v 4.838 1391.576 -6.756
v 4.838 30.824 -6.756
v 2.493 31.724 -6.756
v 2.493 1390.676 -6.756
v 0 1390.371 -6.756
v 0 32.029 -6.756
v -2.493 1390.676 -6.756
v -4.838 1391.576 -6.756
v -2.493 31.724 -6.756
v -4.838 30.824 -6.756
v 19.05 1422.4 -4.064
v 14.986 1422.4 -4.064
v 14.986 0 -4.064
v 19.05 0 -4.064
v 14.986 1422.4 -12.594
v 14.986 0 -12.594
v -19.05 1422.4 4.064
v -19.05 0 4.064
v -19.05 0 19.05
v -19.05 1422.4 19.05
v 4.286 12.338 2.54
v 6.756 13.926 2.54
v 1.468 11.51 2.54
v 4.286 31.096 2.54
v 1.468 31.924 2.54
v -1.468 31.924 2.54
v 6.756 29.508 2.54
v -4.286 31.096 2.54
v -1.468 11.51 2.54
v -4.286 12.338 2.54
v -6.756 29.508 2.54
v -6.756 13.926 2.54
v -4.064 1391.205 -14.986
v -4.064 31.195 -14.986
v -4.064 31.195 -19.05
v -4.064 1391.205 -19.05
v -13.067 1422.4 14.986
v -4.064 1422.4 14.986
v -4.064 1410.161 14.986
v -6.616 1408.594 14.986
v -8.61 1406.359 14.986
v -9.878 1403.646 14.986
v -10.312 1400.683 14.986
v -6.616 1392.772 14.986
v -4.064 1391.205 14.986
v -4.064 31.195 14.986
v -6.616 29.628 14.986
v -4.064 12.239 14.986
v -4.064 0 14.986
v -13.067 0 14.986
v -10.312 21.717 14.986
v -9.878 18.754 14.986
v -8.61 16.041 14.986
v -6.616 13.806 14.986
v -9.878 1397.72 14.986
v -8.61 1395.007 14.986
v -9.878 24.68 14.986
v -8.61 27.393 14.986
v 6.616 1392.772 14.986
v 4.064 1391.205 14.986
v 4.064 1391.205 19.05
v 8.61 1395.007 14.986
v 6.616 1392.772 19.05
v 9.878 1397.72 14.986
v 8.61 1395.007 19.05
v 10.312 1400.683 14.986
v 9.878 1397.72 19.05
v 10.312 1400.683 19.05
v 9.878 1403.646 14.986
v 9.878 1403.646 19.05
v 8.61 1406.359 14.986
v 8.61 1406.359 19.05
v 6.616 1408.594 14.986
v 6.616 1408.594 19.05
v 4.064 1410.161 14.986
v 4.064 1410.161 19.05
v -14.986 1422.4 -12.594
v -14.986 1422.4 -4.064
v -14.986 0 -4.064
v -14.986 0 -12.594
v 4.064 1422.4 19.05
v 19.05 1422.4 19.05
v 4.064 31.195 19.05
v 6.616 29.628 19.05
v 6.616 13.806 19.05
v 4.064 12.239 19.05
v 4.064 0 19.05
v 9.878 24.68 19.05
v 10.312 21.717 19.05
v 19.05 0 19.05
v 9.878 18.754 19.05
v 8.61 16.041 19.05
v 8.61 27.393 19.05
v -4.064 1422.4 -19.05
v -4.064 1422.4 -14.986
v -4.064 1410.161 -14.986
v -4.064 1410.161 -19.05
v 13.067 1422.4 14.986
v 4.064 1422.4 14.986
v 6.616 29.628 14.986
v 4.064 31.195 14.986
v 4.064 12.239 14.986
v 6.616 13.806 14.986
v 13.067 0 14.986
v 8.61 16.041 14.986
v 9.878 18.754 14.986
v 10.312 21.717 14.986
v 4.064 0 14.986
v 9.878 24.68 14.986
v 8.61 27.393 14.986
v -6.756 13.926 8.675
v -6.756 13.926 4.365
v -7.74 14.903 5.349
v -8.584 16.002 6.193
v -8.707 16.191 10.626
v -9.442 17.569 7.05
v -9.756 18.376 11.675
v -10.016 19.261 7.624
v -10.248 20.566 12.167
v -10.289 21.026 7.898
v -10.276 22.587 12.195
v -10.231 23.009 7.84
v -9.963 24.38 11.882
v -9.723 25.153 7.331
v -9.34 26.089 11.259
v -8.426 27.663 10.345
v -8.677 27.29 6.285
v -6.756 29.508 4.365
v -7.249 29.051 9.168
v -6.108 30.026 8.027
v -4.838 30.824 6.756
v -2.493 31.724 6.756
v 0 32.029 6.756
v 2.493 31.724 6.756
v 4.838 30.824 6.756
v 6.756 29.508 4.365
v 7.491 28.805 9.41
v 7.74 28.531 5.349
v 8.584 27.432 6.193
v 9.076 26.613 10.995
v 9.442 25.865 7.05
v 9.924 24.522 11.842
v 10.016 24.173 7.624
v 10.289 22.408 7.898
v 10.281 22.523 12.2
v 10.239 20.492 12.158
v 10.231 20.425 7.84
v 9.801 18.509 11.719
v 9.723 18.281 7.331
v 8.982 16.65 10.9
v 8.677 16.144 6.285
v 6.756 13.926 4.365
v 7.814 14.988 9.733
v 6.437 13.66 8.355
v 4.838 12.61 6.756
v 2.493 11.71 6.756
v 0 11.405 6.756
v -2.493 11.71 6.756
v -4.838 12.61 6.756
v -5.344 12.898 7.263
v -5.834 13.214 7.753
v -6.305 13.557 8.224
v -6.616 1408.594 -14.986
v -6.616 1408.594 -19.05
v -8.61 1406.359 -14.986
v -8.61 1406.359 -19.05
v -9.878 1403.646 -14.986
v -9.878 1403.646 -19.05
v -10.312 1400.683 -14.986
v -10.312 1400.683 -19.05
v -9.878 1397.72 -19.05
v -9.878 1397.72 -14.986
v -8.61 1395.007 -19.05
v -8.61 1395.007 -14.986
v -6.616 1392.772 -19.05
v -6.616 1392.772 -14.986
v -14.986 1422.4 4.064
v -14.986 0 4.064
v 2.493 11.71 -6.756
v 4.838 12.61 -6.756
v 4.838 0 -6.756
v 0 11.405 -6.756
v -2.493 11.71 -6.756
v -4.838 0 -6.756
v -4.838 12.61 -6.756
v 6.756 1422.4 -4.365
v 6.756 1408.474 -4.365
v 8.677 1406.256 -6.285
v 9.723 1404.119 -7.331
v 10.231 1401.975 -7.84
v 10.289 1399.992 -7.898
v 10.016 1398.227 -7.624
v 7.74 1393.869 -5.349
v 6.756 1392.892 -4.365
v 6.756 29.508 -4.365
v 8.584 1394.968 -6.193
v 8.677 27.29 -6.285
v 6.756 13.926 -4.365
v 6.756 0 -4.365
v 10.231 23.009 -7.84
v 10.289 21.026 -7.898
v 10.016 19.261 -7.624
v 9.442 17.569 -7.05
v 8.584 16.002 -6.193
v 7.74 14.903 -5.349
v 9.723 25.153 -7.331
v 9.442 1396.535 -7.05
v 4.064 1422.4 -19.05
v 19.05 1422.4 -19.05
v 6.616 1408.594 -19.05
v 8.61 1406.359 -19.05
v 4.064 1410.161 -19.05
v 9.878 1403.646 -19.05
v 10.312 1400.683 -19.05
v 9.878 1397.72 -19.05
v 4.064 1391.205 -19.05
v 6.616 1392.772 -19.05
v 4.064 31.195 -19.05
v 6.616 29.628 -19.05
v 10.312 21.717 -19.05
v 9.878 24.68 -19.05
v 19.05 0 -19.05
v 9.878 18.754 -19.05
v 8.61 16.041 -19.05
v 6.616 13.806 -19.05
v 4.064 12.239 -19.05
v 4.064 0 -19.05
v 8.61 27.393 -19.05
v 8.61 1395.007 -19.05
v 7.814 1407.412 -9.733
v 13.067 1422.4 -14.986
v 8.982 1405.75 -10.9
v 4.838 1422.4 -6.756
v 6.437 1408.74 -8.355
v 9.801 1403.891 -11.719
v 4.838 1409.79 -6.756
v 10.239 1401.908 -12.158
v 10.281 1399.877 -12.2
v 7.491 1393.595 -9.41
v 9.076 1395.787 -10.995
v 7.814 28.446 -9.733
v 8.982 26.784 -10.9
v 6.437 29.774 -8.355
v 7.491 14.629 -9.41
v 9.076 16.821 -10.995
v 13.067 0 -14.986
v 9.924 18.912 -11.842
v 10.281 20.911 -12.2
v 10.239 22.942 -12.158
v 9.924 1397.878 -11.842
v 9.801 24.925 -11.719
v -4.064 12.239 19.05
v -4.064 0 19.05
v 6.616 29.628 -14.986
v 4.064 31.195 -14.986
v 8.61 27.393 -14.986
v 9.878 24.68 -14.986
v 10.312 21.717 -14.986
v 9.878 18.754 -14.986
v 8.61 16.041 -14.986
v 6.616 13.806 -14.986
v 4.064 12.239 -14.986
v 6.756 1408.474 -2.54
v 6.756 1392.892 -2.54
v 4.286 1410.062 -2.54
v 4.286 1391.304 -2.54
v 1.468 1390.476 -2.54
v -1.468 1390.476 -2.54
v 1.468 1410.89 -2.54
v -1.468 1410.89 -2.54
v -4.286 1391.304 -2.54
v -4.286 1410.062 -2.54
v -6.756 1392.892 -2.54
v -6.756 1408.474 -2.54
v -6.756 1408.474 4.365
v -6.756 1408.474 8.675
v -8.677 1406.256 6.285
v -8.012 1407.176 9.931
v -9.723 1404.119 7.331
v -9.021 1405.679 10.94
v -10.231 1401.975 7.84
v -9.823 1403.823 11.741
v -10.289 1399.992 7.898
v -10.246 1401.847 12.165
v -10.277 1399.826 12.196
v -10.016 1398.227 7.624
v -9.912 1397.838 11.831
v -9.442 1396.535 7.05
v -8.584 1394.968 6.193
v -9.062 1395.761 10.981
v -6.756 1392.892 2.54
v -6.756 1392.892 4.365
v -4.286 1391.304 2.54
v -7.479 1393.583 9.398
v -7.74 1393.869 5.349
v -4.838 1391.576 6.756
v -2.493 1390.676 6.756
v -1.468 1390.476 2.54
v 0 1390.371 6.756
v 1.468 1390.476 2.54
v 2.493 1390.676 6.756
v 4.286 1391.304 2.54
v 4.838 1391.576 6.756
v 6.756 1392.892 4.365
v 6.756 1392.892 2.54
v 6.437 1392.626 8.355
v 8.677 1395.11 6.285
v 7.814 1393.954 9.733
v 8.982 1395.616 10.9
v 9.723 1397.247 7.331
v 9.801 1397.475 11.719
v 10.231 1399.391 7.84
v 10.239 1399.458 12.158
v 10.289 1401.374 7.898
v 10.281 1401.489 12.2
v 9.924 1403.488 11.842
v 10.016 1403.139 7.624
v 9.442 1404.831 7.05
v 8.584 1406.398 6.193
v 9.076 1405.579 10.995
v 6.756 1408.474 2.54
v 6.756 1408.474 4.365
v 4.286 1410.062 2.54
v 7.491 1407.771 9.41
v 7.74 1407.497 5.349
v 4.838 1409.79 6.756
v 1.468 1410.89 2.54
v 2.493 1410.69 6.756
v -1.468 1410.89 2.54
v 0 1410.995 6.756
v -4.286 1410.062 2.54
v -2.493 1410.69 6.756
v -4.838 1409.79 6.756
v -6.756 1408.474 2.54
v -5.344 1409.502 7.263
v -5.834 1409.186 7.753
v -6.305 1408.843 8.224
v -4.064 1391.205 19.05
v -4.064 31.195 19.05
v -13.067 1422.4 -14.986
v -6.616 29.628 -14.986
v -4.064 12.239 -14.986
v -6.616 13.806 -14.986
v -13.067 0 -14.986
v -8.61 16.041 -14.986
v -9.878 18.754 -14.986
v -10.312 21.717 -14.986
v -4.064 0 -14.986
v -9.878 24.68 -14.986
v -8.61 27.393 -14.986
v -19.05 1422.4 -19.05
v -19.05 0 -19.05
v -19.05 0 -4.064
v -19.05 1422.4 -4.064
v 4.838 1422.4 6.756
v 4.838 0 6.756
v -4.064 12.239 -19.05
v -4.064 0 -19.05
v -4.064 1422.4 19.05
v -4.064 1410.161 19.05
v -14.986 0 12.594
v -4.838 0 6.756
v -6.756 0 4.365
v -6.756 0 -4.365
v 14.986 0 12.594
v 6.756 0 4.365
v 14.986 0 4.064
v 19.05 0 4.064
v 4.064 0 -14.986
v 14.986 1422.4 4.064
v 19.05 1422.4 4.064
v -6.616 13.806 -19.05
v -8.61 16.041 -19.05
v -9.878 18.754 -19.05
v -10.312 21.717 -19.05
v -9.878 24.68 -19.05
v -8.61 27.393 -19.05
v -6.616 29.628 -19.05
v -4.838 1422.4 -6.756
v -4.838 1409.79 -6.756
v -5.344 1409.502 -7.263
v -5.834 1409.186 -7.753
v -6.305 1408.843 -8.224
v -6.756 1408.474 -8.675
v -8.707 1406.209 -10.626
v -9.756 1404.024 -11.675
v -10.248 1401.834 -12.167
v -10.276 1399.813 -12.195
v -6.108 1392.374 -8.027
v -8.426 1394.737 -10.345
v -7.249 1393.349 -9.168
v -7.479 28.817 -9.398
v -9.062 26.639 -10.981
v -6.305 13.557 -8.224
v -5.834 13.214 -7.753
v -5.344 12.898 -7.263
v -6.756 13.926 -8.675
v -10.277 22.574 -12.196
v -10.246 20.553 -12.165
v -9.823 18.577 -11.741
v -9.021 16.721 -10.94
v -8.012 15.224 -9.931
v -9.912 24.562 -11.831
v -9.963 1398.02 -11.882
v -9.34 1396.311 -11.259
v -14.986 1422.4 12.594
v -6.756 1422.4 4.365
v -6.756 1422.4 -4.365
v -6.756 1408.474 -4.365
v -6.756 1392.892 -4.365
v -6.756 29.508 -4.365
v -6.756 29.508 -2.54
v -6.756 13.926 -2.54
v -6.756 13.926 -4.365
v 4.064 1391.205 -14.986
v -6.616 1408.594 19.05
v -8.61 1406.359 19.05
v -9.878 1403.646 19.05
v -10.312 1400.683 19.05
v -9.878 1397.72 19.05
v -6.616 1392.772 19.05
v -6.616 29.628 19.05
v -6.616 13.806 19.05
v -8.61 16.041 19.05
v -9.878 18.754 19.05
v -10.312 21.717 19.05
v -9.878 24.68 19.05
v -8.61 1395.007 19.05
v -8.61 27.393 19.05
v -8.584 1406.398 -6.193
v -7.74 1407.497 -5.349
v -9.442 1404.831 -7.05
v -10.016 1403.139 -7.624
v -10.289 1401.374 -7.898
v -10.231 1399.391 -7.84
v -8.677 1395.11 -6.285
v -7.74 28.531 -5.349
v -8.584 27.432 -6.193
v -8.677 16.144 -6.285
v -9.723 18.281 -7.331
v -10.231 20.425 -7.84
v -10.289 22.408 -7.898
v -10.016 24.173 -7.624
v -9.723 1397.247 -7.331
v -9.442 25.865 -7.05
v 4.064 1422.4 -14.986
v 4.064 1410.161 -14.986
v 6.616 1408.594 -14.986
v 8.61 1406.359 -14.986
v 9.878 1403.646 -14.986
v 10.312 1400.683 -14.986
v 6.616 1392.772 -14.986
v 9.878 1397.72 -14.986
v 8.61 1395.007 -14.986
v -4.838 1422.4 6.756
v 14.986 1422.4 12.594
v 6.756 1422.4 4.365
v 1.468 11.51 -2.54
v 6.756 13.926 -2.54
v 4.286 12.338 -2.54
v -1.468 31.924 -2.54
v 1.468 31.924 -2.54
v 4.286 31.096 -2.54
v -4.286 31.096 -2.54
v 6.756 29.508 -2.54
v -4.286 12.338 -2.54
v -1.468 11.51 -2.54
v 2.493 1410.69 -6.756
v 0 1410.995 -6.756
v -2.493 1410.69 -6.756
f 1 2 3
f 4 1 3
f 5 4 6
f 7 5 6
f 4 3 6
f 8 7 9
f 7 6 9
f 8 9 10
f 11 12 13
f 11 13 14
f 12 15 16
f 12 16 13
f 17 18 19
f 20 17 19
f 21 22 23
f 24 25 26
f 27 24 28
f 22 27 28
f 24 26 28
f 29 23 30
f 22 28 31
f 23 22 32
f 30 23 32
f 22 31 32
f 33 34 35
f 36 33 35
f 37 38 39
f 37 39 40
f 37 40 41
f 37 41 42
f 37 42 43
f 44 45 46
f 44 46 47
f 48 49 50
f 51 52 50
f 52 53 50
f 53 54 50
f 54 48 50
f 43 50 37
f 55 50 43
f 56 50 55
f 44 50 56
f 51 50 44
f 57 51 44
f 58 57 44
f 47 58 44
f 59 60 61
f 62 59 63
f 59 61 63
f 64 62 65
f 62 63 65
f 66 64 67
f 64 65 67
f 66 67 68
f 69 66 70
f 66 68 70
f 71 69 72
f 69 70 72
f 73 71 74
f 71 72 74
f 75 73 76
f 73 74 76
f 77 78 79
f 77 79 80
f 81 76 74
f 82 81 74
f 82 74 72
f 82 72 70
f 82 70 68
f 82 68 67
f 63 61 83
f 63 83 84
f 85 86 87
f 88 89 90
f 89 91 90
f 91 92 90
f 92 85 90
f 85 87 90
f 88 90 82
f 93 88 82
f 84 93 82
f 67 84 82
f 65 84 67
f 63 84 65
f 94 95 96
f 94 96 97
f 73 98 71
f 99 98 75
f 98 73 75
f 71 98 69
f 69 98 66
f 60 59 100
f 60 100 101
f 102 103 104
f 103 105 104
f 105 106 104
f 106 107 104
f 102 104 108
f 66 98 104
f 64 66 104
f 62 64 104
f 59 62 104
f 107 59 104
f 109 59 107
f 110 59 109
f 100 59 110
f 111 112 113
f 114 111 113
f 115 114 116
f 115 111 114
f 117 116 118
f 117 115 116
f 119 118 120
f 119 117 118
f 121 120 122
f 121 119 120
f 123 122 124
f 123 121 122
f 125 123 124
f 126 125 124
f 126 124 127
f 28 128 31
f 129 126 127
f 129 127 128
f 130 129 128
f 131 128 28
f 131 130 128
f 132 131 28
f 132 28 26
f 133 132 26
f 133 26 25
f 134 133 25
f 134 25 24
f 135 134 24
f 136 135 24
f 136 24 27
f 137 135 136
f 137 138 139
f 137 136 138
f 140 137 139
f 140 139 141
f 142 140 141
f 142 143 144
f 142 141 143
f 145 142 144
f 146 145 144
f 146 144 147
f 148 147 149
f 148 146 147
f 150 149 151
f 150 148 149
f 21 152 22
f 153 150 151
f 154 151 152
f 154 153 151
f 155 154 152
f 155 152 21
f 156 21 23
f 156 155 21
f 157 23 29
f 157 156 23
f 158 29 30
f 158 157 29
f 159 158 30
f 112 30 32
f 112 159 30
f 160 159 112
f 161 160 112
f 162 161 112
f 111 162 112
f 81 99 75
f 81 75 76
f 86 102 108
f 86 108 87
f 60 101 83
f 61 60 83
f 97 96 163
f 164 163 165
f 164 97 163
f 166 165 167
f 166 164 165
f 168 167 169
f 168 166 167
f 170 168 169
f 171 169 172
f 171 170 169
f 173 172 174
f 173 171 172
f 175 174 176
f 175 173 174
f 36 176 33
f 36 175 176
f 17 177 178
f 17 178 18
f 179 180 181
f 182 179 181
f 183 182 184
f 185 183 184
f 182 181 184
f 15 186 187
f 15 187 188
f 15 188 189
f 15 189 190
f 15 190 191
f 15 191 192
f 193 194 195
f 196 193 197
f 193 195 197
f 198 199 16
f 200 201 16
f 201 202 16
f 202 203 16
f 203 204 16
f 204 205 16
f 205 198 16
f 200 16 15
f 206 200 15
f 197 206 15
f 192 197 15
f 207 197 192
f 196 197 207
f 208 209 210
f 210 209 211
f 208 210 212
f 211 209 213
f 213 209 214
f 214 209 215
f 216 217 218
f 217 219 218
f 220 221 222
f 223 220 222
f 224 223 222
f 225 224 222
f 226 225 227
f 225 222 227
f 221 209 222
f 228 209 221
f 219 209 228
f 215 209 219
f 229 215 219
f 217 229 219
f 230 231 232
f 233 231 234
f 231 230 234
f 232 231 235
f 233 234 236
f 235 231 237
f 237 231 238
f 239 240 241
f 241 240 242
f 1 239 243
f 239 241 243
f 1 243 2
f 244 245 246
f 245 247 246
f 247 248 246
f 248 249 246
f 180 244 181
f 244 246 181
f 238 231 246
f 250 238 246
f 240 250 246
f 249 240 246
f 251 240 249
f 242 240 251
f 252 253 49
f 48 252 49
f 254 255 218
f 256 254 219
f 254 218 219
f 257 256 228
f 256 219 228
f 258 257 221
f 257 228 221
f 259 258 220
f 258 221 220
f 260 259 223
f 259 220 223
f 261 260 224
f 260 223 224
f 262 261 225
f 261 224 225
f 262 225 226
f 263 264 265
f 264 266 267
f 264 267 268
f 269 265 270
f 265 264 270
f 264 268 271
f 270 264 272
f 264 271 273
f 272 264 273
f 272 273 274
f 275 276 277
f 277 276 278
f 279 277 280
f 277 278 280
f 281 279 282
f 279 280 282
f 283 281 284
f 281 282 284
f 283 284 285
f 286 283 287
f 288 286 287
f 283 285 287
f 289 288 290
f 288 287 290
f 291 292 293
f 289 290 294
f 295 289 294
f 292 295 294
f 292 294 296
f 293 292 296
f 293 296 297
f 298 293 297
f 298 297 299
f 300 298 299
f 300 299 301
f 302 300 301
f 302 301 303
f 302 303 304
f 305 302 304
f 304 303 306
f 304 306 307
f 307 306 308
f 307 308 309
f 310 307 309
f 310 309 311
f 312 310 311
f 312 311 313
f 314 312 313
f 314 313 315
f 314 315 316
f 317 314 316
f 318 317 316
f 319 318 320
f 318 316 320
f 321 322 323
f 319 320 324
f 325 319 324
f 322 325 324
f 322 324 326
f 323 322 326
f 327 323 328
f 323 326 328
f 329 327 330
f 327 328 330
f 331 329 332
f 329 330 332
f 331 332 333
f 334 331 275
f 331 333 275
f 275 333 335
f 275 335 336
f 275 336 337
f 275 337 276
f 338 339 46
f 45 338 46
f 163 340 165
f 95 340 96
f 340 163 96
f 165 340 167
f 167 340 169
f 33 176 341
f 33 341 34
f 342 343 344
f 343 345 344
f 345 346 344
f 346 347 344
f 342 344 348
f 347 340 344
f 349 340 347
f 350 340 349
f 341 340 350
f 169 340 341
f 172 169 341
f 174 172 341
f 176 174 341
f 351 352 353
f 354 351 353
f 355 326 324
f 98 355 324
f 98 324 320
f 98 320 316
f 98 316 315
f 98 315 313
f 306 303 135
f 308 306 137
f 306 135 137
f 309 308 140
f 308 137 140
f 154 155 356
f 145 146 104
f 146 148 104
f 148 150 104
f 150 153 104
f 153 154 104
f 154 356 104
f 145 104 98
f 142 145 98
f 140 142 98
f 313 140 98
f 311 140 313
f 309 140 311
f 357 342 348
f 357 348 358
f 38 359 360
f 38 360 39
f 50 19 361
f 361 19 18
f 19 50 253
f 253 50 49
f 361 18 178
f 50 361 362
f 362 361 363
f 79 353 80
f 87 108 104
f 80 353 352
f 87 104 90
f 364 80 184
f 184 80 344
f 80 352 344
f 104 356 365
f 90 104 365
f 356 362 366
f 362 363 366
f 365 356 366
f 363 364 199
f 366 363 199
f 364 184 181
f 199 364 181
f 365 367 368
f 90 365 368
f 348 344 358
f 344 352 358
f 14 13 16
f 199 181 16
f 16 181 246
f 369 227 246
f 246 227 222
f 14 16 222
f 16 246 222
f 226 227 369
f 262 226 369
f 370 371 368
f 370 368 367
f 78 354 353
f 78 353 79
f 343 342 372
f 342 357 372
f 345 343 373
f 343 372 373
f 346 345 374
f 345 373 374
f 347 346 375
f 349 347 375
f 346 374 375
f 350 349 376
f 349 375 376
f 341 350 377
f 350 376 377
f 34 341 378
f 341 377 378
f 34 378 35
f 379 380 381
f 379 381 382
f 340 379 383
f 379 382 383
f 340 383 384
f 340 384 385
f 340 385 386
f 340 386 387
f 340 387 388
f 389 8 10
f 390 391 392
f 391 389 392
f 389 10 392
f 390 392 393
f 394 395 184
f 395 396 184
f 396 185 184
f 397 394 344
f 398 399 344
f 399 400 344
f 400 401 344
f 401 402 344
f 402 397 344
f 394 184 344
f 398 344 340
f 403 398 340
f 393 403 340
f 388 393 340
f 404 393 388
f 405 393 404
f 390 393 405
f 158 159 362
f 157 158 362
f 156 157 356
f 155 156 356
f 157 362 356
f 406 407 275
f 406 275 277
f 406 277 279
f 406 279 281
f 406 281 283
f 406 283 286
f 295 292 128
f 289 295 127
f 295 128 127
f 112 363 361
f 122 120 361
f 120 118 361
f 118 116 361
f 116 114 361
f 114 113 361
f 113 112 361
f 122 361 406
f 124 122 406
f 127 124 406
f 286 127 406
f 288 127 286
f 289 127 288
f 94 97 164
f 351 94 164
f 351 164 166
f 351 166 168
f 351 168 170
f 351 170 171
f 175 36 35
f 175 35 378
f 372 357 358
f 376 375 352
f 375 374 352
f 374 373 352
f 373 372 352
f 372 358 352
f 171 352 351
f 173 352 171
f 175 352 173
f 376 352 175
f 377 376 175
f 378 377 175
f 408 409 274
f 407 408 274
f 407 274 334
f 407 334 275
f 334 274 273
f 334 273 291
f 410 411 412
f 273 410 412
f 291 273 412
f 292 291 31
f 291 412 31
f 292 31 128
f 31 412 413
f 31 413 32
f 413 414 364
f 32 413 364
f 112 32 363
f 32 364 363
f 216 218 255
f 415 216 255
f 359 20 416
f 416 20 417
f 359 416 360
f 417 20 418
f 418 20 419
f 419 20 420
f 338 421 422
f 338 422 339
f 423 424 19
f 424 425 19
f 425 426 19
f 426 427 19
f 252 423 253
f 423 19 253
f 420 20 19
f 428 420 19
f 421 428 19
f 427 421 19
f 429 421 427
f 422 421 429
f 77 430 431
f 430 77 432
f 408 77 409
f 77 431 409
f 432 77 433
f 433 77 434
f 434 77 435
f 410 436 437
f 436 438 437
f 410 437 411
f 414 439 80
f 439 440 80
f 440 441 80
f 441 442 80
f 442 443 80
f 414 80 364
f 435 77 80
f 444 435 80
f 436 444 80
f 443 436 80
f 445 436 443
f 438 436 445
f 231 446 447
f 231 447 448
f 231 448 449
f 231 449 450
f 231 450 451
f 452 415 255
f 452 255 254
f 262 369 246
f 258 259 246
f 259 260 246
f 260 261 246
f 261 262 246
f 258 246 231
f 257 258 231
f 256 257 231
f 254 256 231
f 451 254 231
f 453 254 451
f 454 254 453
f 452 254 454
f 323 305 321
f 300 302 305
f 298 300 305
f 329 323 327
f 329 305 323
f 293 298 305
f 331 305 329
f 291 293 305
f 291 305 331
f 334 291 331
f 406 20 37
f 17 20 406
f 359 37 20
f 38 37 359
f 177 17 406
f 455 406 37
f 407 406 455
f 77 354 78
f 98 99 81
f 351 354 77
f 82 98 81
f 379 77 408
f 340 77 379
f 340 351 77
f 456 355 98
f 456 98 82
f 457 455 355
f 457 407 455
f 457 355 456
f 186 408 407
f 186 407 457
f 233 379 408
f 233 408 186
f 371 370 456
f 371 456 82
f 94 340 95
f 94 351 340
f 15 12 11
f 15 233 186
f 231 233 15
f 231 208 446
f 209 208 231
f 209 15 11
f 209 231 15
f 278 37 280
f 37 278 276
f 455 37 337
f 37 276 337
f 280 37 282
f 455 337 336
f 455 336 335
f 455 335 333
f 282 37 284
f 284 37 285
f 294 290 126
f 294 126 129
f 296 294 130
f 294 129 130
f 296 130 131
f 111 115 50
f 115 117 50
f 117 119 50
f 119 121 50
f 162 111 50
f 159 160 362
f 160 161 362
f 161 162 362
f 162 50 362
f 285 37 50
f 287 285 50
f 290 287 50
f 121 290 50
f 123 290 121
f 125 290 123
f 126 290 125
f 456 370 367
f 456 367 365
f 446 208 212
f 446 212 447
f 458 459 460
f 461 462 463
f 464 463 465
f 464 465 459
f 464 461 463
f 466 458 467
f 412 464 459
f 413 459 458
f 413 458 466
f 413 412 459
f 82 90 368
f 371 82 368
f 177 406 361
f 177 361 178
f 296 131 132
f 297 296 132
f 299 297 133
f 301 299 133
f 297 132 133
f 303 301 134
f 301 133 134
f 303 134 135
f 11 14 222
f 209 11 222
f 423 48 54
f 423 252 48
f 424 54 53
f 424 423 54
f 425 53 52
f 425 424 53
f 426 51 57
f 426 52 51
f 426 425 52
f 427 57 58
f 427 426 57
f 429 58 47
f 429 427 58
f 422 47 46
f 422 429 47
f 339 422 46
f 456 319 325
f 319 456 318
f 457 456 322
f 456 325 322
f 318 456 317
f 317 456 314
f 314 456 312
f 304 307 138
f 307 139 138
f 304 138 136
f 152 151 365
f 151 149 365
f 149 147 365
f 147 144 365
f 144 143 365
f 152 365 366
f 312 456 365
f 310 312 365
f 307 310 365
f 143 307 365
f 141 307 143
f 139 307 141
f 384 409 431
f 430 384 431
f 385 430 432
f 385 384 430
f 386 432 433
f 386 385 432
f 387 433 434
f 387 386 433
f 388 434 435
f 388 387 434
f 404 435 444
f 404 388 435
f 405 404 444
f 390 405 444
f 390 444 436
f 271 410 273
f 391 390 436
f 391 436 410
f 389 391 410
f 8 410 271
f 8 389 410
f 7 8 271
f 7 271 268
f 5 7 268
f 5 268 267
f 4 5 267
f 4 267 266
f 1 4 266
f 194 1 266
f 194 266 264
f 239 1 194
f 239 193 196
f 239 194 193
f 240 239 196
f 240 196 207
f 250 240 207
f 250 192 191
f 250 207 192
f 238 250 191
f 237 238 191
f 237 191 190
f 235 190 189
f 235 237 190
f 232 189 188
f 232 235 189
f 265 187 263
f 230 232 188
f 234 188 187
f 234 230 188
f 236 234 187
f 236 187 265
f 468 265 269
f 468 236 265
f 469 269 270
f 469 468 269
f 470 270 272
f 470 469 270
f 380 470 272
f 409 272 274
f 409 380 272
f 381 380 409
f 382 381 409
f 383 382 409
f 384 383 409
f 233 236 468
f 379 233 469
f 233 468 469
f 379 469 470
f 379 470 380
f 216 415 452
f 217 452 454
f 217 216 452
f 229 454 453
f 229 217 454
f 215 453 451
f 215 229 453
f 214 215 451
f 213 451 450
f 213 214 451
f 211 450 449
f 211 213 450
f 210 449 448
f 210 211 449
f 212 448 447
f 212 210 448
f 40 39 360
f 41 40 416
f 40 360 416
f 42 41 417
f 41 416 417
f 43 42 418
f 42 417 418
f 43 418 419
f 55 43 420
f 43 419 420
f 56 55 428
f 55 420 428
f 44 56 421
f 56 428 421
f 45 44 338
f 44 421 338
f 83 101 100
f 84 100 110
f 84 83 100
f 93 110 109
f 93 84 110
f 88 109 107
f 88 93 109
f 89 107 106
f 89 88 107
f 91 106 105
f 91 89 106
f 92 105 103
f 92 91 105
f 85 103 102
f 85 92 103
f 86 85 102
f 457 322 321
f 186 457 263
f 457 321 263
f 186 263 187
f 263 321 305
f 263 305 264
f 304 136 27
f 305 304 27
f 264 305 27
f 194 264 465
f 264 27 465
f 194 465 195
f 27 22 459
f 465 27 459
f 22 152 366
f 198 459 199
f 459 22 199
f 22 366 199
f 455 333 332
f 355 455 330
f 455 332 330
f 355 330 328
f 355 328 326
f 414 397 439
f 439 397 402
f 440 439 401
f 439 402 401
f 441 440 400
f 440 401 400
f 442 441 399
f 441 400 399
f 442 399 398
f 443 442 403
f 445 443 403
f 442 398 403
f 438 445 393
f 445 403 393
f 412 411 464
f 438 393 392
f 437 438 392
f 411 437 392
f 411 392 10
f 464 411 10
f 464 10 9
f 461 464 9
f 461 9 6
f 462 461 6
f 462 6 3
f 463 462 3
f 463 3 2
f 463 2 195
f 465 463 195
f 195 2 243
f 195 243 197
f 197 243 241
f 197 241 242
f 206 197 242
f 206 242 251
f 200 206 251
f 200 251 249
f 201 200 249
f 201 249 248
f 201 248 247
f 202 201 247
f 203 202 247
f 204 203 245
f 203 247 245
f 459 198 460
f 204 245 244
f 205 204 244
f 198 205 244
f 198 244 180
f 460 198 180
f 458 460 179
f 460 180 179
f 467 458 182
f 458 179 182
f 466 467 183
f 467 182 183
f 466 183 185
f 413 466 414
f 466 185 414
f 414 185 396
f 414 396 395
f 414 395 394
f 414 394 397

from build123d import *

# Parameters (mm, degrees)
EXTRUDE1_DEPTH          = 1422.4
SKETCH2_R               = 10.3124
CUT_EXTRUDE1_DEPTH      = 16.51
MIRROR2_COPY_1_SKETCH_R = 10.3124
MIRROR2_COPY_1_DEPTH    = 16.51


# Read off the part's stored shape, not the designer's step: 1515<1>
with BuildPart() as part:
    # Sketch1<2> → Extrude1 (new body)
    with BuildSketch(Plane(origin=(0, 0, 0), x_dir=(1, 0, 0), z_dir=(0, 1, 0))):
        Polygon((-6.7564, 4.364749804), (-6.7564, -4.364749804), (-14.986, -12.594349804), (-14.986, -4.064), (-19.05, -4.064), (-19.05, -19.05), (-4.064, -19.05), (-4.064, -14.986), (-13.067127258, -14.986), (-4.837527258, -6.7564), (4.837527258, -6.7564), (13.067127258, -14.986), (4.064, -14.986), (4.064, -19.05), (19.05, -19.05), (19.05, -4.064), (14.986, -4.064), (14.986, -12.594349804), (6.7564, -4.364749804), (6.7564, 4.364749804), (14.986, 12.594349804), (14.986, 4.064), (19.05, 4.064), (19.05, 19.05), (4.064, 19.05), (4.064, 14.986), (13.067127258, 14.986), (4.837527258, 6.7564), (-4.837527258, 6.7564), (-13.067127258, 14.986), (-4.064, 14.986), (-4.064, 19.05), (-19.05, 19.05), (-19.05, 4.064), (-14.986, 4.064), (-14.986, 12.594349804), align=None)
    extrude(amount=EXTRUDE1_DEPTH)

    # Sketch2 → Cut-Extrude1 (cut)
    with BuildSketch(Plane(origin=(0, 0, -19.05), x_dir=(-1, 0, 0), z_dir=(0, 0, -1))):
        with Locations(Location((0, 21.717, 0), (0, 0, 310.932724574))):
            Circle(SKETCH2_R)
    cut_extrude1 = extrude(amount=-CUT_EXTRUDE1_DEPTH, mode=Mode.SUBTRACT)

    # Mirror1: Cut-Extrude1 across plane
    add(cut_extrude1.mirror(Plane.XY), mode=Mode.SUBTRACT)

    # Mirror2: Cut-Extrude1 across plane
    add(cut_extrude1.mirror(Plane(origin=(0, 711.2, 0), x_dir=(0, 0, 1), z_dir=(0, -1, 0))), mode=Mode.SUBTRACT)

    # Mirror2 copy 1 sketch → Mirror2 copy 1 (cut)
    with BuildSketch(Plane(origin=(0, 1422.4, 19.05), x_dir=(-1, 0, 0), z_dir=(0, 0, 1))):
        with Locations(Location((0, 21.717, 0), (0, 0, 310.932724574))):
            Circle(MIRROR2_COPY_1_SKETCH_R)
    extrude(amount=-MIRROR2_COPY_1_DEPTH, mode=Mode.SUBTRACT)


solid = part.part
